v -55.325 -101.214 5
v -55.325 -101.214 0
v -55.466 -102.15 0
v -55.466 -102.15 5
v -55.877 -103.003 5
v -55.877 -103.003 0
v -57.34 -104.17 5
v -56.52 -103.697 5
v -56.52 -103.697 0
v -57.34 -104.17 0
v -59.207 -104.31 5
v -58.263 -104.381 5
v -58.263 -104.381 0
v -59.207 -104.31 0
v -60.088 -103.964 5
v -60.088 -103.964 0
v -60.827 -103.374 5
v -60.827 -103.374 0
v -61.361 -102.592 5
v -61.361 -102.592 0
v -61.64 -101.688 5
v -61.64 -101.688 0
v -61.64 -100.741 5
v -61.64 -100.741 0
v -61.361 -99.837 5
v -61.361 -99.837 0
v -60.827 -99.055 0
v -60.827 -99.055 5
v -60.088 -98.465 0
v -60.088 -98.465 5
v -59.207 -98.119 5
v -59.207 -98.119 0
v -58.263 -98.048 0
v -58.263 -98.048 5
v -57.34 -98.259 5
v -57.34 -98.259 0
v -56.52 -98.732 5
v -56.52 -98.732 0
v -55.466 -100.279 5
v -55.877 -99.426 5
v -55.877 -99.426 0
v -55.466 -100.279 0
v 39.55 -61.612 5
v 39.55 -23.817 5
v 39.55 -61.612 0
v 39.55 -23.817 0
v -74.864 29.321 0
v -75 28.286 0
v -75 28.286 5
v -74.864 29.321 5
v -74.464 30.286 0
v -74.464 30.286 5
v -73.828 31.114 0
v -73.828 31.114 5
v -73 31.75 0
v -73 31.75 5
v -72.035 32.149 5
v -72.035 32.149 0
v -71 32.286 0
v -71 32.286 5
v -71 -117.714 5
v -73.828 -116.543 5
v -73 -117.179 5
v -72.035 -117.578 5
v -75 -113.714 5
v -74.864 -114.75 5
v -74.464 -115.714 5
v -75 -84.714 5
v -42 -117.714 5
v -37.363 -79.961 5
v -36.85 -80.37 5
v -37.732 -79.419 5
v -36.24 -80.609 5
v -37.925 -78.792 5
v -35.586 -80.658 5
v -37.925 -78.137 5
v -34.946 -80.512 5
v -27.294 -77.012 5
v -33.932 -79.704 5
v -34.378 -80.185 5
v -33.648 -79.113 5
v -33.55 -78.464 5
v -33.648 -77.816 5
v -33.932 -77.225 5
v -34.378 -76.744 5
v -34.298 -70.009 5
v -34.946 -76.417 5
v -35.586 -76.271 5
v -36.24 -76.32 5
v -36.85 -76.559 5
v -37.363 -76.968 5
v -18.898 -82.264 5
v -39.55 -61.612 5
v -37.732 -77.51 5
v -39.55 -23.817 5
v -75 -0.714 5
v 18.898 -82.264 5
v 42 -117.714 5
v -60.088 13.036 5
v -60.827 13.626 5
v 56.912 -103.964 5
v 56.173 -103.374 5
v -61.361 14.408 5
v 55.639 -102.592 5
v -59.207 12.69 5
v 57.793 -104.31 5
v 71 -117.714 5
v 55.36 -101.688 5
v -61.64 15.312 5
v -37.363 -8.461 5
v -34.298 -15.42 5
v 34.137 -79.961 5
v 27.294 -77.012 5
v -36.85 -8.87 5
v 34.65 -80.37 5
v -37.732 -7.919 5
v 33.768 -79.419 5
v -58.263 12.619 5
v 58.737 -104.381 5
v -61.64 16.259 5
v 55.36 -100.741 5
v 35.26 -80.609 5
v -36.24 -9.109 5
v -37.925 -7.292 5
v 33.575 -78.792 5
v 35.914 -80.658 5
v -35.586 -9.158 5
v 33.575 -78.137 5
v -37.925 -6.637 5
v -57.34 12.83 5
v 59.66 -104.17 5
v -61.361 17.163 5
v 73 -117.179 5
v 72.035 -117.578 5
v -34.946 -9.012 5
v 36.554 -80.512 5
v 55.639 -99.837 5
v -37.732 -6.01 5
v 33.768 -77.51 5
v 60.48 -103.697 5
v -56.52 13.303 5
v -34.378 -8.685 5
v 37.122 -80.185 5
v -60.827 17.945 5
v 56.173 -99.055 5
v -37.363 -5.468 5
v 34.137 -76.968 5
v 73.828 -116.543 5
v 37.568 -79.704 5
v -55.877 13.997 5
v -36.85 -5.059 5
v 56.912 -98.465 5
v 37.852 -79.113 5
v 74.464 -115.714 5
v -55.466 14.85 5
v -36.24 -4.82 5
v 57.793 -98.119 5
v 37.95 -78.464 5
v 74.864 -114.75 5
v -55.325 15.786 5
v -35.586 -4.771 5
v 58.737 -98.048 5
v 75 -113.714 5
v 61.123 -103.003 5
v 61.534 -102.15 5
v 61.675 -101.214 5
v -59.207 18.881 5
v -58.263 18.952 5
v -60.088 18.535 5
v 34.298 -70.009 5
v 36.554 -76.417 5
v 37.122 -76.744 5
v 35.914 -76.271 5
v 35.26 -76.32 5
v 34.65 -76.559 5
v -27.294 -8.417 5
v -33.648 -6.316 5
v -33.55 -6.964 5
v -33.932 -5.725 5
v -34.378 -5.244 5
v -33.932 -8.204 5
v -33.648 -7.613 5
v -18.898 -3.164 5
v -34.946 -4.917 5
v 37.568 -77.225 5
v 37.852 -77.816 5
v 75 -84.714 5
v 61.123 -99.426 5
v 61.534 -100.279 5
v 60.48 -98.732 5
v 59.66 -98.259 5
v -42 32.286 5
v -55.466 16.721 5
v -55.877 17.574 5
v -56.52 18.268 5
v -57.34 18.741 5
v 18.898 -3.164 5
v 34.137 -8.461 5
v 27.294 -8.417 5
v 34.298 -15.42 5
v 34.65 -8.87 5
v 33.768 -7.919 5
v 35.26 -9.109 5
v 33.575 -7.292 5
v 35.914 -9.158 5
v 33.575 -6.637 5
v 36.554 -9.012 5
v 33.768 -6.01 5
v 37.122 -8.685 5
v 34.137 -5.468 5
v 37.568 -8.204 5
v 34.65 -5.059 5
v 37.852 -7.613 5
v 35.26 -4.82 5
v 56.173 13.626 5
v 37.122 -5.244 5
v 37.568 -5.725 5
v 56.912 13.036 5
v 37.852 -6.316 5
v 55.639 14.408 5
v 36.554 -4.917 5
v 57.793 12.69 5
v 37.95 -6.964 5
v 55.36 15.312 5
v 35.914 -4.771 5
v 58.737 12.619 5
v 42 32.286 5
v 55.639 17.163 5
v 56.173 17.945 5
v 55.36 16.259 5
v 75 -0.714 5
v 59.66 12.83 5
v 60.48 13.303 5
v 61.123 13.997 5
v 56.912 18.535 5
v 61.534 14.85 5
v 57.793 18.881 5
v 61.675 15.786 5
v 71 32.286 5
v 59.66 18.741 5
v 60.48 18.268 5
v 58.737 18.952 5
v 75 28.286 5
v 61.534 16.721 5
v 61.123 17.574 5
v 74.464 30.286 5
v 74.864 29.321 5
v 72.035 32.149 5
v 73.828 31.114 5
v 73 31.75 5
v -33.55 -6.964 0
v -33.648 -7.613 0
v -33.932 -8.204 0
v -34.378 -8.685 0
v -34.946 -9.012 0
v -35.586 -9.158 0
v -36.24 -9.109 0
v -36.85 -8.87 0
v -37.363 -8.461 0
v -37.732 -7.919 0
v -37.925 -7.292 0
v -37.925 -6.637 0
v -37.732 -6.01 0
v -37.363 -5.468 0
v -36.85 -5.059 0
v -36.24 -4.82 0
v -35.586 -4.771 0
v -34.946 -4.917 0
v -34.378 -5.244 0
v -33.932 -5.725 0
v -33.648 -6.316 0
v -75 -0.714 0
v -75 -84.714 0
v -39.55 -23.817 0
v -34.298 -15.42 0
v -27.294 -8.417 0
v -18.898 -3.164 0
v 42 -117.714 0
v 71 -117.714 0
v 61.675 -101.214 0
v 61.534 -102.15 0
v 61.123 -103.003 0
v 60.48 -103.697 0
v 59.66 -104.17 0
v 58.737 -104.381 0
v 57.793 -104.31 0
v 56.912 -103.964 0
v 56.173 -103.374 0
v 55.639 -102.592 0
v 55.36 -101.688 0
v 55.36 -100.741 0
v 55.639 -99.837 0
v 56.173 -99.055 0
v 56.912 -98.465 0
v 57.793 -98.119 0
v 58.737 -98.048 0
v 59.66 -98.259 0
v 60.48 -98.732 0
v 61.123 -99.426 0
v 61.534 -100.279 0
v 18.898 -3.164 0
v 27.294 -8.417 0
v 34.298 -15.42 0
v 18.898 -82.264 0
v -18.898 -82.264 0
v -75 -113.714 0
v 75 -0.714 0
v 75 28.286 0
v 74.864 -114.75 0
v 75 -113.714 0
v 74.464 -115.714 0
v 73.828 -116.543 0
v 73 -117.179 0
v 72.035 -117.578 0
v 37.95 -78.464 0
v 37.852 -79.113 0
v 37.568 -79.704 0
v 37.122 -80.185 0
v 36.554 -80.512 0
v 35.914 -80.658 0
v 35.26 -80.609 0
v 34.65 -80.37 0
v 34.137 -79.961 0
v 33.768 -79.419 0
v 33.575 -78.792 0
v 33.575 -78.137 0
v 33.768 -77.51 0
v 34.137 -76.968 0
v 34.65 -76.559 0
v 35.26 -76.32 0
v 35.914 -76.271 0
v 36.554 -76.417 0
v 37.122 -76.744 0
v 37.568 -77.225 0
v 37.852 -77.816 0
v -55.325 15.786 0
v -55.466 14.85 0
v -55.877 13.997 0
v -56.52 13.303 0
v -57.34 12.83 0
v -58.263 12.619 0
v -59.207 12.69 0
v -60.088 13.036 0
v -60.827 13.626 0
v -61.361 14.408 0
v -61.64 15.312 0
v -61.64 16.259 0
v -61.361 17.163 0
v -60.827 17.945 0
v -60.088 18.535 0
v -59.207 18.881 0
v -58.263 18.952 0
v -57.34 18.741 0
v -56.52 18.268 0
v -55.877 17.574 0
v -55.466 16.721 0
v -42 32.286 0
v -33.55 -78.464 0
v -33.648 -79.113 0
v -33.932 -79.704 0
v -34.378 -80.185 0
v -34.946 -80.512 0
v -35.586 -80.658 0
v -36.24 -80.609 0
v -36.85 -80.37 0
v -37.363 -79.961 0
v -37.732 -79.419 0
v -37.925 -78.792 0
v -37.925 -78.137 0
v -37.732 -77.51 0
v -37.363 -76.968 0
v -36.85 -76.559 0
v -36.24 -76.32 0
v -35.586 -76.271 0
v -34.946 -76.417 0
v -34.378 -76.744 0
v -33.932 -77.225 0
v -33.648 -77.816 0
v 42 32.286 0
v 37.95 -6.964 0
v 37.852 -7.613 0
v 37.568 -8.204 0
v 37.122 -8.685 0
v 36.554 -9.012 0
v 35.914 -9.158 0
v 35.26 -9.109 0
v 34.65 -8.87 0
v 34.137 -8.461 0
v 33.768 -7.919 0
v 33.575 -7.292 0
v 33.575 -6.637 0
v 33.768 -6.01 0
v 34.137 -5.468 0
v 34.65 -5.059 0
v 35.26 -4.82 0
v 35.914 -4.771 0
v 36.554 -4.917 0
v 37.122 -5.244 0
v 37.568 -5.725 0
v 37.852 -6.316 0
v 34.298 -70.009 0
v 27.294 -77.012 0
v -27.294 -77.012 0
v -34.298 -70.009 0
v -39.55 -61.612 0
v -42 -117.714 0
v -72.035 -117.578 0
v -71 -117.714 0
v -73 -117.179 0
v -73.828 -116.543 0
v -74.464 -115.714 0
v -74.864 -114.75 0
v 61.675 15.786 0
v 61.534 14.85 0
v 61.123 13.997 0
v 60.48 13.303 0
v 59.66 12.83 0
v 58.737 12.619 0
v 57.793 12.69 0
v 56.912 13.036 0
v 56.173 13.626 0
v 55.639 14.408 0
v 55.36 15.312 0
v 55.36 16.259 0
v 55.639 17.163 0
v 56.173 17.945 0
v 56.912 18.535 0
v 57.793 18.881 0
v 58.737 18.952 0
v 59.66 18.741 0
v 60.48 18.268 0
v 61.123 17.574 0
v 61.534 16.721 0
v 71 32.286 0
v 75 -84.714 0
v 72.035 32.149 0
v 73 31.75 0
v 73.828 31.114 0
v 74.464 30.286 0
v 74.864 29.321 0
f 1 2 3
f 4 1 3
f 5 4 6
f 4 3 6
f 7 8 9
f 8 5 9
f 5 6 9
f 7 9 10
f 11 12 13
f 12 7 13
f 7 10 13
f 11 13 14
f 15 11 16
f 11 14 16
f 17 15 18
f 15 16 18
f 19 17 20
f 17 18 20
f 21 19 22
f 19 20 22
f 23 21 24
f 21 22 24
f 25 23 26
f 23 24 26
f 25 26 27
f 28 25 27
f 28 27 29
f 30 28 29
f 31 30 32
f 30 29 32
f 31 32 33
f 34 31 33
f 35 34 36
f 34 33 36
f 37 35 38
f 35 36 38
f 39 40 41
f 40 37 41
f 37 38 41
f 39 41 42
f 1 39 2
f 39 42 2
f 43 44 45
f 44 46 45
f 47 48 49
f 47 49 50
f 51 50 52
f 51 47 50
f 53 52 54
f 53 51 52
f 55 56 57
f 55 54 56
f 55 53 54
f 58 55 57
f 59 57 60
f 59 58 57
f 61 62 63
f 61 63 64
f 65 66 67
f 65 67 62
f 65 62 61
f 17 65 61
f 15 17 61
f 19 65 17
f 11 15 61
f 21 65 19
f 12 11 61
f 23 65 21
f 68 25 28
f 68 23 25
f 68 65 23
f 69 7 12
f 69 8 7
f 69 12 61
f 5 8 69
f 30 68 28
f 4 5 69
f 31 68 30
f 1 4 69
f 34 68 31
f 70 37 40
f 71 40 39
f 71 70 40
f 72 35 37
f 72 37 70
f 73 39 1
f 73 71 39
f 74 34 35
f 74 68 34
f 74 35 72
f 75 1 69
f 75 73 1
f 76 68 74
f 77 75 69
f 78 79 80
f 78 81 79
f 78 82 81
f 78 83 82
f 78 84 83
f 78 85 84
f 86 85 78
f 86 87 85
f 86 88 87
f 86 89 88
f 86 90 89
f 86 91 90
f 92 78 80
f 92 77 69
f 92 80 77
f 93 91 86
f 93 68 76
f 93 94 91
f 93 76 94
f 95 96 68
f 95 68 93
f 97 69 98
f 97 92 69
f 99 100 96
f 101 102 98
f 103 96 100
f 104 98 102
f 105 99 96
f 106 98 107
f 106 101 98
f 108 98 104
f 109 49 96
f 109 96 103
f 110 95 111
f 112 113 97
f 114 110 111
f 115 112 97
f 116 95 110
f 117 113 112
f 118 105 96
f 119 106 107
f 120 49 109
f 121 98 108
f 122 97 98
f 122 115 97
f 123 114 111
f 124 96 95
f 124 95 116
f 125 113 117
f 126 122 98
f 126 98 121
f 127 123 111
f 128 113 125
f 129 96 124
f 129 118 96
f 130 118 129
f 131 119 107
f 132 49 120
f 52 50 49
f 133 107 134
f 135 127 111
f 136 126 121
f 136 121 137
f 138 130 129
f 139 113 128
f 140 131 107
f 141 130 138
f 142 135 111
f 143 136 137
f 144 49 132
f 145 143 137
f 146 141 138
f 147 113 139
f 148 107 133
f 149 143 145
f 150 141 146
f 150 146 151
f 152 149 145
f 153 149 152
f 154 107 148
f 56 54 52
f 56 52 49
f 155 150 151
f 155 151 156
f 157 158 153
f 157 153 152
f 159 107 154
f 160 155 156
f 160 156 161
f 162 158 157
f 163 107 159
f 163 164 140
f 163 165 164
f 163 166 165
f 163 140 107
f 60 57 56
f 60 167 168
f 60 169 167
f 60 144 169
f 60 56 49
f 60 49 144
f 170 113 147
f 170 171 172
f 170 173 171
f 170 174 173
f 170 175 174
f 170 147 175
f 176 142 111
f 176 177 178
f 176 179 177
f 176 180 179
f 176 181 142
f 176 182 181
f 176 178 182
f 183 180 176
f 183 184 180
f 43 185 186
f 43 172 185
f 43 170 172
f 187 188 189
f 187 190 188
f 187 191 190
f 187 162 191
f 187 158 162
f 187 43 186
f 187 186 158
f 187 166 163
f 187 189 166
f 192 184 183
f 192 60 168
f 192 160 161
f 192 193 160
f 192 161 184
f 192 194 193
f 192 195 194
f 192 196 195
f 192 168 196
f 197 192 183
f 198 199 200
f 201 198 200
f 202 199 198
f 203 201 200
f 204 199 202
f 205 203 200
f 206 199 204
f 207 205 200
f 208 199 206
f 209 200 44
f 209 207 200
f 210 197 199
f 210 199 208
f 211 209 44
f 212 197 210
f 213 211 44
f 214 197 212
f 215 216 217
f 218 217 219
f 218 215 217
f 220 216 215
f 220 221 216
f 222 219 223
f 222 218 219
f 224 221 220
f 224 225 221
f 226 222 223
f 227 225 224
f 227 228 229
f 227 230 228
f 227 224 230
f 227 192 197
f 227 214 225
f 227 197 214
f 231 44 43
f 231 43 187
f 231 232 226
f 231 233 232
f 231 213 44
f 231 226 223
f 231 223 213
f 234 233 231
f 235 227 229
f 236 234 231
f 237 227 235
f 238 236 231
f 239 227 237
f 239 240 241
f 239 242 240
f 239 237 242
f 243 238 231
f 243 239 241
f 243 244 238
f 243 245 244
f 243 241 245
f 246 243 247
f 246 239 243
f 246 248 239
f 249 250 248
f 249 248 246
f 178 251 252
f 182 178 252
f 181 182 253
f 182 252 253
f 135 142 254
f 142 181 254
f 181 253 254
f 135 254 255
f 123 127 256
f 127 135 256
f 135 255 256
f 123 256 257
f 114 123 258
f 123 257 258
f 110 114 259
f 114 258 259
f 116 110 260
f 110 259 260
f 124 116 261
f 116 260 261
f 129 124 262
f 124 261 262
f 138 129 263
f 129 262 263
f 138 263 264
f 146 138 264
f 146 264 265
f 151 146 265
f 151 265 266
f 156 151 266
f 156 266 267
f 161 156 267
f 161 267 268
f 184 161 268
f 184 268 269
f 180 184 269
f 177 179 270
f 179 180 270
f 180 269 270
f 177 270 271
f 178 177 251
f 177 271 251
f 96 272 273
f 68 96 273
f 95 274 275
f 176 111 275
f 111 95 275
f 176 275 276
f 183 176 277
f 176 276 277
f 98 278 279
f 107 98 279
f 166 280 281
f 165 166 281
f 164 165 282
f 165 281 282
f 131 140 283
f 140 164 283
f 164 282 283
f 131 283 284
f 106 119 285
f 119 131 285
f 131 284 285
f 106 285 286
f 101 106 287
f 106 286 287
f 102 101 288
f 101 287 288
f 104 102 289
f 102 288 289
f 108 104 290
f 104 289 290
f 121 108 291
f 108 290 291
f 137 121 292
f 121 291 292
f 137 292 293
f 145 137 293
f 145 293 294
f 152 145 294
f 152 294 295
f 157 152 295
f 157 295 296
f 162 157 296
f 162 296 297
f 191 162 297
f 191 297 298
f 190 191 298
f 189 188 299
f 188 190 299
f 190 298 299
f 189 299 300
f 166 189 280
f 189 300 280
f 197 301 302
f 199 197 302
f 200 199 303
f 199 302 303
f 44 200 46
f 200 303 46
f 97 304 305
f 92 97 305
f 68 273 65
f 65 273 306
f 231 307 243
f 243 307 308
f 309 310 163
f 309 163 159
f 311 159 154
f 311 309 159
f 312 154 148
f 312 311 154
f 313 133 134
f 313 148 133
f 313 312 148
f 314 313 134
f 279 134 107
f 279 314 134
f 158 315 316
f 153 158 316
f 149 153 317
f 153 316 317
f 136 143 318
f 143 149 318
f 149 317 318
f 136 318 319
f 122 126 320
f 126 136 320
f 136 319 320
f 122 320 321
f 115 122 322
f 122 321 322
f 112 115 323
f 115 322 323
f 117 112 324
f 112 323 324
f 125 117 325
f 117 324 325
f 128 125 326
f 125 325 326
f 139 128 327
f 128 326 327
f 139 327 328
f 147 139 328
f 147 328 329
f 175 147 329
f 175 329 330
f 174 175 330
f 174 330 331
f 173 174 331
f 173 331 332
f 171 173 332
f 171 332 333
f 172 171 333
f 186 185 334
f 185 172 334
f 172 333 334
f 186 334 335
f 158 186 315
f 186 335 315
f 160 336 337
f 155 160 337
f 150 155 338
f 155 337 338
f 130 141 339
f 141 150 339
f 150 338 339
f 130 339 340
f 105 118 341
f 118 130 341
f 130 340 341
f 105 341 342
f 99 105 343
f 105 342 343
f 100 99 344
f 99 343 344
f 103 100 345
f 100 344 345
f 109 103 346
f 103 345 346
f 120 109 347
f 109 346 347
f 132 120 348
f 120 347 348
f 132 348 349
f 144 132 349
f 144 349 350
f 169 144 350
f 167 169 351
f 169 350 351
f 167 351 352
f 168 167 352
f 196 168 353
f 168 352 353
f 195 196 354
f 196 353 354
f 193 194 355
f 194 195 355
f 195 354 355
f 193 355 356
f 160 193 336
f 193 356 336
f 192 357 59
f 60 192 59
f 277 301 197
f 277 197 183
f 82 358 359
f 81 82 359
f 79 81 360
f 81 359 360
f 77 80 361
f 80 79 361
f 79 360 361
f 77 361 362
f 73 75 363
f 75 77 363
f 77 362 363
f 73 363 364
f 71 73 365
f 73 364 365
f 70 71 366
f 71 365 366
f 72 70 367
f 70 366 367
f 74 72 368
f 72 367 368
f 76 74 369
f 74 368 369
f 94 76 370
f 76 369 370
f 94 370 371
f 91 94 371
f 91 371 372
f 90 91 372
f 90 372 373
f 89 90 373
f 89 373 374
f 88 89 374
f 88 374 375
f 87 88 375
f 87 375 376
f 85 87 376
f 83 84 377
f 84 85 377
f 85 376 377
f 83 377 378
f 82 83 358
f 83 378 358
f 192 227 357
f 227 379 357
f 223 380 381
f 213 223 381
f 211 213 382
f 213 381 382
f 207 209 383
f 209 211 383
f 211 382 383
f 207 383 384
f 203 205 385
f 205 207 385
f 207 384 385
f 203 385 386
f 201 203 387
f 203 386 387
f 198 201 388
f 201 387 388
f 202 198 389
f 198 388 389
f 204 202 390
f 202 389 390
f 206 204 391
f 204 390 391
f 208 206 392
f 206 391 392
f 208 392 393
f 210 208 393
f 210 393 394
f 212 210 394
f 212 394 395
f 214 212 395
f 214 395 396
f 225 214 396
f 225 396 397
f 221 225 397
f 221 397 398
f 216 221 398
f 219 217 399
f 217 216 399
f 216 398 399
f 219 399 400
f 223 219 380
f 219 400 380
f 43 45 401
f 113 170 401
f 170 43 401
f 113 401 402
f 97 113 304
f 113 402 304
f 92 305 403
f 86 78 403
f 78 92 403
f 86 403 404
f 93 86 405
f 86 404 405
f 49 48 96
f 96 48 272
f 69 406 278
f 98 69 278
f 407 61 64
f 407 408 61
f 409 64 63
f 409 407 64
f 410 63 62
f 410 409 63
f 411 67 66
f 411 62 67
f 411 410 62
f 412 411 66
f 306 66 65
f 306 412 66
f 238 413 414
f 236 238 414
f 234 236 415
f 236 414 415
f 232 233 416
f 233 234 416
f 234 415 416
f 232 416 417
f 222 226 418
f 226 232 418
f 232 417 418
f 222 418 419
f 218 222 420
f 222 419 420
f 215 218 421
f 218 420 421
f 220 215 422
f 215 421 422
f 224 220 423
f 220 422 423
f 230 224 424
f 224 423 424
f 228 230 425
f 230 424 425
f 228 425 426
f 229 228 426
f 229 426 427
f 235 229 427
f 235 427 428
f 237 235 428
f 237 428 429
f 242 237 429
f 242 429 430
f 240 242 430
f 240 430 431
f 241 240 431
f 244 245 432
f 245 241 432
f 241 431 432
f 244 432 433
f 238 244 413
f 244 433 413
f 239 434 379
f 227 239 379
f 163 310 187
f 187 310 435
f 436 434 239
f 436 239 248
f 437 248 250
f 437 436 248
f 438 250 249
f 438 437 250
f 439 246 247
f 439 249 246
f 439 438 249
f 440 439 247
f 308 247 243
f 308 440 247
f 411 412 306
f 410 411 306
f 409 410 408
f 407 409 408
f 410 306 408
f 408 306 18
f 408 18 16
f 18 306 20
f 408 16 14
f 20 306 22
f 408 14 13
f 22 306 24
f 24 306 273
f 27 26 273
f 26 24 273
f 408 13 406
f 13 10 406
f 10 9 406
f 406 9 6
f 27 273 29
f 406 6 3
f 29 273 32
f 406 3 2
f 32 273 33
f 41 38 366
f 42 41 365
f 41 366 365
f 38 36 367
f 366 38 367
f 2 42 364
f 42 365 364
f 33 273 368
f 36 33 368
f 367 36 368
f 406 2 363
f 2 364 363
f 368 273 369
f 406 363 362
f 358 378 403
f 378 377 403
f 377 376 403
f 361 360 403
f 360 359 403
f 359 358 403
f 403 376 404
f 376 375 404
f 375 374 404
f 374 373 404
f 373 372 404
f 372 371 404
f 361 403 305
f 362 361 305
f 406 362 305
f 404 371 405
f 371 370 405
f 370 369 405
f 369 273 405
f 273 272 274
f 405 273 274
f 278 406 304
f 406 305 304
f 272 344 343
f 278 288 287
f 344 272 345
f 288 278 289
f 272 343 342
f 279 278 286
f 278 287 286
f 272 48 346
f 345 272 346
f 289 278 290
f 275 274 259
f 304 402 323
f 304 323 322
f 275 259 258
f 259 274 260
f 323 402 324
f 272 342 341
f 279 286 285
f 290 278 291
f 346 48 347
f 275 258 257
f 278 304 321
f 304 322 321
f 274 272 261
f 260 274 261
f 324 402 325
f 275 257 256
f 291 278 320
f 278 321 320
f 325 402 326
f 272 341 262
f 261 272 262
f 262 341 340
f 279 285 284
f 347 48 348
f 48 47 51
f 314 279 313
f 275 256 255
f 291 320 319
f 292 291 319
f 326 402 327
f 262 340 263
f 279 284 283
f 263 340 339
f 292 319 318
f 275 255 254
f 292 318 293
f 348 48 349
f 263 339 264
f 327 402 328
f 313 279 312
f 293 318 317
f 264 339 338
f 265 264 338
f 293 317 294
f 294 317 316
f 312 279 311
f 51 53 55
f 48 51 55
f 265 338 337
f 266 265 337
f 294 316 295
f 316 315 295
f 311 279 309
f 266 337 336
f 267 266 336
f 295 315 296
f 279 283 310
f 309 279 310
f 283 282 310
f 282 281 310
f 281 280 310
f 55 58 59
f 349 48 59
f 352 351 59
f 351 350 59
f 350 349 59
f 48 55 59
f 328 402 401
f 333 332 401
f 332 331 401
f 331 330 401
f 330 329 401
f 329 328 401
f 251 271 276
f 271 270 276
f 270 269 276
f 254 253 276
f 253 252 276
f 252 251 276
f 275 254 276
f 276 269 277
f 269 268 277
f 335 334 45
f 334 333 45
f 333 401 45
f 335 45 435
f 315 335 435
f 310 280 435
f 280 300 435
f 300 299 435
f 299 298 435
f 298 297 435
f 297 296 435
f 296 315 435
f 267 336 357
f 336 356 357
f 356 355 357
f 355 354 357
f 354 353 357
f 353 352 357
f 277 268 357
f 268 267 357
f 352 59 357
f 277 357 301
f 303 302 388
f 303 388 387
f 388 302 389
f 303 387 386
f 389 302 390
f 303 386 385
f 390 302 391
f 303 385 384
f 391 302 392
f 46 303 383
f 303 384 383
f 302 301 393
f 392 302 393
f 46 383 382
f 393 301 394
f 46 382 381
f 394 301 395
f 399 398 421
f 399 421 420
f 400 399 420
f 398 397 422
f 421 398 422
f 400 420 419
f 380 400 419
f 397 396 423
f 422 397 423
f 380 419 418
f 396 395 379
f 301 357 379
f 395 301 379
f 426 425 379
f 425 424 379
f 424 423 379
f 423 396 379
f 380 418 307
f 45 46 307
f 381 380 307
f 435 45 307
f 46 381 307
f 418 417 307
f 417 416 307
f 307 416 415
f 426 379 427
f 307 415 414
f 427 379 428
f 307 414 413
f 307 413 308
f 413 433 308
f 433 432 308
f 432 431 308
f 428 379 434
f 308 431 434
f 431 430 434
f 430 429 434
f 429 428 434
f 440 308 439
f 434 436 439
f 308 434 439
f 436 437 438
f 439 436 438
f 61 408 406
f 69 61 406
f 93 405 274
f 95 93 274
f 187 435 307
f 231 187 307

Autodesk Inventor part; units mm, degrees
ref_plane "YZ Plane" through (0, 0, 0) normal (1, 0, 0) x (0, 1, 0)
ref_plane "XZ Plane" through (0, 0, 0) normal (0, 1, 0) x (-1, 0, 0)
ref_plane "XY Plane" through (0, 0, 0) normal (0, 0, 1) x (1, 0, 0)
sketch "Boceto1" plane through (0, 0, 0) normal (0, 0, 1) x (1, 0, 0)
  line L0 (71, 32.2855) -> (-71, 32.2855)
  line L1 (-75, 28.2855) -> (-75, -113.7145)
  line L2 (-71, -117.7145) -> (71, -117.7145)
  line L3 (75, -113.7145) -> (75, 28.2855)
  line L4 (75, 32.2855) -> (-75, -117.7145) construction
  line L5 (-75, 32.2855) -> (75, -117.7145) construction
  circle A0 centre (35.75, -6.9645) radius 2.2 projected
  circle A1 centre (35.75, -78.4645) radius 2.2 projected
  circle A2 centre (-35.75, -78.4645) radius 2.2 projected
  circle A3 centre (-35.75, -6.9645) radius 2.2 projected
  arc A4 (39.55, -23.817) -> (18.8975, -3.1645) centre (0, -42.7145) ccw projected
  arc A5 (18.8975, -82.2645) -> (39.55, -61.612) centre (0, -42.7145) ccw projected
  arc A6 (-39.55, -61.612) -> (-18.8975, -82.2645) centre (0, -42.7145) ccw projected
  arc A7 (-18.8975, -3.1645) -> (-39.55, -23.817) centre (0, -42.7145) ccw projected
  line L6 (18.8975, -3.1645) -> (-18.8975, -3.1645)
  line L7 (39.55, -23.817) -> (39.55, -61.612)
  line L8 (18.8975, -82.2645) -> (-18.8975, -82.2645)
  line L9 (-39.55, -61.612) -> (-39.55, -23.817)
  line L10 (71, -117.7145) -> (42, -117.7145)
  line L11 (75, -84.7145) -> (75, -113.7145)
  line L12 (71, 32.2855) -> (42, 32.2855)
  line L13 (75, -0.7145) -> (75, 28.2855)
  line L14 (-71, 32.2855) -> (-42, 32.2855)
  line L15 (-75, -0.7145) -> (-75, 28.2855)
  line L16 (-71, -117.7145) -> (-42, -117.7145)
  line L17 (-75, -84.7145) -> (-75, -113.7145)
  line L18 (42, 32.2855) -> (75, -0.7145) construction
  line L19 (75, -84.7145) -> (42, -117.7145) construction
  line L20 (-75, -84.7145) -> (-42, -117.7145) construction
  line L21 (-42, 32.2855) -> (-75, -0.7145) construction
  circle A8 centre (-58.5, 15.7855) radius 3.175
  circle A9 centre (-58.5, -101.2145) radius 3.175
  circle A10 centre (58.5, 15.7855) radius 3.175
  circle A11 centre (58.5, -101.2145) radius 3.175
  arc A12 (75, 28.2855) -> (71, 32.2855) centre (71, 28.2855) ccw
  arc A13 (71, -117.7145) -> (75, -113.7145) centre (71, -113.7145) ccw
  arc A14 (-75, -113.7145) -> (-71, -117.7145) centre (-71, -113.7145) ccw
  arc A15 (-71, 32.2855) -> (-75, 28.2855) centre (-71, 28.2855) ccw
  arc A16 (18.8975, -82.2645) -> (39.55, -61.612) centre (0, -42.7145) ccw
  arc A17 (-39.55, -61.612) -> (-18.8975, -82.2645) centre (0, -42.7145) ccw
  arc A18 (39.55, -23.817) -> (18.8975, -3.1645) centre (0, -42.7145) ccw
  arc A19 (-18.8975, -3.1645) -> (-39.55, -23.817) centre (0, -42.7145) ccw
  point P0 (0, 0)
  dimension "d10" = 6.35
  dimension "d11" = 6.35
  dimension "d12" = 6.35
  dimension "d13" = 6.35
  dimension "d14" = 4
extrude "Extrusión1" add sketch "Boceto1" along normal blind 5
properties part number "TablaSoporte1" material "Madera (abedul)"
